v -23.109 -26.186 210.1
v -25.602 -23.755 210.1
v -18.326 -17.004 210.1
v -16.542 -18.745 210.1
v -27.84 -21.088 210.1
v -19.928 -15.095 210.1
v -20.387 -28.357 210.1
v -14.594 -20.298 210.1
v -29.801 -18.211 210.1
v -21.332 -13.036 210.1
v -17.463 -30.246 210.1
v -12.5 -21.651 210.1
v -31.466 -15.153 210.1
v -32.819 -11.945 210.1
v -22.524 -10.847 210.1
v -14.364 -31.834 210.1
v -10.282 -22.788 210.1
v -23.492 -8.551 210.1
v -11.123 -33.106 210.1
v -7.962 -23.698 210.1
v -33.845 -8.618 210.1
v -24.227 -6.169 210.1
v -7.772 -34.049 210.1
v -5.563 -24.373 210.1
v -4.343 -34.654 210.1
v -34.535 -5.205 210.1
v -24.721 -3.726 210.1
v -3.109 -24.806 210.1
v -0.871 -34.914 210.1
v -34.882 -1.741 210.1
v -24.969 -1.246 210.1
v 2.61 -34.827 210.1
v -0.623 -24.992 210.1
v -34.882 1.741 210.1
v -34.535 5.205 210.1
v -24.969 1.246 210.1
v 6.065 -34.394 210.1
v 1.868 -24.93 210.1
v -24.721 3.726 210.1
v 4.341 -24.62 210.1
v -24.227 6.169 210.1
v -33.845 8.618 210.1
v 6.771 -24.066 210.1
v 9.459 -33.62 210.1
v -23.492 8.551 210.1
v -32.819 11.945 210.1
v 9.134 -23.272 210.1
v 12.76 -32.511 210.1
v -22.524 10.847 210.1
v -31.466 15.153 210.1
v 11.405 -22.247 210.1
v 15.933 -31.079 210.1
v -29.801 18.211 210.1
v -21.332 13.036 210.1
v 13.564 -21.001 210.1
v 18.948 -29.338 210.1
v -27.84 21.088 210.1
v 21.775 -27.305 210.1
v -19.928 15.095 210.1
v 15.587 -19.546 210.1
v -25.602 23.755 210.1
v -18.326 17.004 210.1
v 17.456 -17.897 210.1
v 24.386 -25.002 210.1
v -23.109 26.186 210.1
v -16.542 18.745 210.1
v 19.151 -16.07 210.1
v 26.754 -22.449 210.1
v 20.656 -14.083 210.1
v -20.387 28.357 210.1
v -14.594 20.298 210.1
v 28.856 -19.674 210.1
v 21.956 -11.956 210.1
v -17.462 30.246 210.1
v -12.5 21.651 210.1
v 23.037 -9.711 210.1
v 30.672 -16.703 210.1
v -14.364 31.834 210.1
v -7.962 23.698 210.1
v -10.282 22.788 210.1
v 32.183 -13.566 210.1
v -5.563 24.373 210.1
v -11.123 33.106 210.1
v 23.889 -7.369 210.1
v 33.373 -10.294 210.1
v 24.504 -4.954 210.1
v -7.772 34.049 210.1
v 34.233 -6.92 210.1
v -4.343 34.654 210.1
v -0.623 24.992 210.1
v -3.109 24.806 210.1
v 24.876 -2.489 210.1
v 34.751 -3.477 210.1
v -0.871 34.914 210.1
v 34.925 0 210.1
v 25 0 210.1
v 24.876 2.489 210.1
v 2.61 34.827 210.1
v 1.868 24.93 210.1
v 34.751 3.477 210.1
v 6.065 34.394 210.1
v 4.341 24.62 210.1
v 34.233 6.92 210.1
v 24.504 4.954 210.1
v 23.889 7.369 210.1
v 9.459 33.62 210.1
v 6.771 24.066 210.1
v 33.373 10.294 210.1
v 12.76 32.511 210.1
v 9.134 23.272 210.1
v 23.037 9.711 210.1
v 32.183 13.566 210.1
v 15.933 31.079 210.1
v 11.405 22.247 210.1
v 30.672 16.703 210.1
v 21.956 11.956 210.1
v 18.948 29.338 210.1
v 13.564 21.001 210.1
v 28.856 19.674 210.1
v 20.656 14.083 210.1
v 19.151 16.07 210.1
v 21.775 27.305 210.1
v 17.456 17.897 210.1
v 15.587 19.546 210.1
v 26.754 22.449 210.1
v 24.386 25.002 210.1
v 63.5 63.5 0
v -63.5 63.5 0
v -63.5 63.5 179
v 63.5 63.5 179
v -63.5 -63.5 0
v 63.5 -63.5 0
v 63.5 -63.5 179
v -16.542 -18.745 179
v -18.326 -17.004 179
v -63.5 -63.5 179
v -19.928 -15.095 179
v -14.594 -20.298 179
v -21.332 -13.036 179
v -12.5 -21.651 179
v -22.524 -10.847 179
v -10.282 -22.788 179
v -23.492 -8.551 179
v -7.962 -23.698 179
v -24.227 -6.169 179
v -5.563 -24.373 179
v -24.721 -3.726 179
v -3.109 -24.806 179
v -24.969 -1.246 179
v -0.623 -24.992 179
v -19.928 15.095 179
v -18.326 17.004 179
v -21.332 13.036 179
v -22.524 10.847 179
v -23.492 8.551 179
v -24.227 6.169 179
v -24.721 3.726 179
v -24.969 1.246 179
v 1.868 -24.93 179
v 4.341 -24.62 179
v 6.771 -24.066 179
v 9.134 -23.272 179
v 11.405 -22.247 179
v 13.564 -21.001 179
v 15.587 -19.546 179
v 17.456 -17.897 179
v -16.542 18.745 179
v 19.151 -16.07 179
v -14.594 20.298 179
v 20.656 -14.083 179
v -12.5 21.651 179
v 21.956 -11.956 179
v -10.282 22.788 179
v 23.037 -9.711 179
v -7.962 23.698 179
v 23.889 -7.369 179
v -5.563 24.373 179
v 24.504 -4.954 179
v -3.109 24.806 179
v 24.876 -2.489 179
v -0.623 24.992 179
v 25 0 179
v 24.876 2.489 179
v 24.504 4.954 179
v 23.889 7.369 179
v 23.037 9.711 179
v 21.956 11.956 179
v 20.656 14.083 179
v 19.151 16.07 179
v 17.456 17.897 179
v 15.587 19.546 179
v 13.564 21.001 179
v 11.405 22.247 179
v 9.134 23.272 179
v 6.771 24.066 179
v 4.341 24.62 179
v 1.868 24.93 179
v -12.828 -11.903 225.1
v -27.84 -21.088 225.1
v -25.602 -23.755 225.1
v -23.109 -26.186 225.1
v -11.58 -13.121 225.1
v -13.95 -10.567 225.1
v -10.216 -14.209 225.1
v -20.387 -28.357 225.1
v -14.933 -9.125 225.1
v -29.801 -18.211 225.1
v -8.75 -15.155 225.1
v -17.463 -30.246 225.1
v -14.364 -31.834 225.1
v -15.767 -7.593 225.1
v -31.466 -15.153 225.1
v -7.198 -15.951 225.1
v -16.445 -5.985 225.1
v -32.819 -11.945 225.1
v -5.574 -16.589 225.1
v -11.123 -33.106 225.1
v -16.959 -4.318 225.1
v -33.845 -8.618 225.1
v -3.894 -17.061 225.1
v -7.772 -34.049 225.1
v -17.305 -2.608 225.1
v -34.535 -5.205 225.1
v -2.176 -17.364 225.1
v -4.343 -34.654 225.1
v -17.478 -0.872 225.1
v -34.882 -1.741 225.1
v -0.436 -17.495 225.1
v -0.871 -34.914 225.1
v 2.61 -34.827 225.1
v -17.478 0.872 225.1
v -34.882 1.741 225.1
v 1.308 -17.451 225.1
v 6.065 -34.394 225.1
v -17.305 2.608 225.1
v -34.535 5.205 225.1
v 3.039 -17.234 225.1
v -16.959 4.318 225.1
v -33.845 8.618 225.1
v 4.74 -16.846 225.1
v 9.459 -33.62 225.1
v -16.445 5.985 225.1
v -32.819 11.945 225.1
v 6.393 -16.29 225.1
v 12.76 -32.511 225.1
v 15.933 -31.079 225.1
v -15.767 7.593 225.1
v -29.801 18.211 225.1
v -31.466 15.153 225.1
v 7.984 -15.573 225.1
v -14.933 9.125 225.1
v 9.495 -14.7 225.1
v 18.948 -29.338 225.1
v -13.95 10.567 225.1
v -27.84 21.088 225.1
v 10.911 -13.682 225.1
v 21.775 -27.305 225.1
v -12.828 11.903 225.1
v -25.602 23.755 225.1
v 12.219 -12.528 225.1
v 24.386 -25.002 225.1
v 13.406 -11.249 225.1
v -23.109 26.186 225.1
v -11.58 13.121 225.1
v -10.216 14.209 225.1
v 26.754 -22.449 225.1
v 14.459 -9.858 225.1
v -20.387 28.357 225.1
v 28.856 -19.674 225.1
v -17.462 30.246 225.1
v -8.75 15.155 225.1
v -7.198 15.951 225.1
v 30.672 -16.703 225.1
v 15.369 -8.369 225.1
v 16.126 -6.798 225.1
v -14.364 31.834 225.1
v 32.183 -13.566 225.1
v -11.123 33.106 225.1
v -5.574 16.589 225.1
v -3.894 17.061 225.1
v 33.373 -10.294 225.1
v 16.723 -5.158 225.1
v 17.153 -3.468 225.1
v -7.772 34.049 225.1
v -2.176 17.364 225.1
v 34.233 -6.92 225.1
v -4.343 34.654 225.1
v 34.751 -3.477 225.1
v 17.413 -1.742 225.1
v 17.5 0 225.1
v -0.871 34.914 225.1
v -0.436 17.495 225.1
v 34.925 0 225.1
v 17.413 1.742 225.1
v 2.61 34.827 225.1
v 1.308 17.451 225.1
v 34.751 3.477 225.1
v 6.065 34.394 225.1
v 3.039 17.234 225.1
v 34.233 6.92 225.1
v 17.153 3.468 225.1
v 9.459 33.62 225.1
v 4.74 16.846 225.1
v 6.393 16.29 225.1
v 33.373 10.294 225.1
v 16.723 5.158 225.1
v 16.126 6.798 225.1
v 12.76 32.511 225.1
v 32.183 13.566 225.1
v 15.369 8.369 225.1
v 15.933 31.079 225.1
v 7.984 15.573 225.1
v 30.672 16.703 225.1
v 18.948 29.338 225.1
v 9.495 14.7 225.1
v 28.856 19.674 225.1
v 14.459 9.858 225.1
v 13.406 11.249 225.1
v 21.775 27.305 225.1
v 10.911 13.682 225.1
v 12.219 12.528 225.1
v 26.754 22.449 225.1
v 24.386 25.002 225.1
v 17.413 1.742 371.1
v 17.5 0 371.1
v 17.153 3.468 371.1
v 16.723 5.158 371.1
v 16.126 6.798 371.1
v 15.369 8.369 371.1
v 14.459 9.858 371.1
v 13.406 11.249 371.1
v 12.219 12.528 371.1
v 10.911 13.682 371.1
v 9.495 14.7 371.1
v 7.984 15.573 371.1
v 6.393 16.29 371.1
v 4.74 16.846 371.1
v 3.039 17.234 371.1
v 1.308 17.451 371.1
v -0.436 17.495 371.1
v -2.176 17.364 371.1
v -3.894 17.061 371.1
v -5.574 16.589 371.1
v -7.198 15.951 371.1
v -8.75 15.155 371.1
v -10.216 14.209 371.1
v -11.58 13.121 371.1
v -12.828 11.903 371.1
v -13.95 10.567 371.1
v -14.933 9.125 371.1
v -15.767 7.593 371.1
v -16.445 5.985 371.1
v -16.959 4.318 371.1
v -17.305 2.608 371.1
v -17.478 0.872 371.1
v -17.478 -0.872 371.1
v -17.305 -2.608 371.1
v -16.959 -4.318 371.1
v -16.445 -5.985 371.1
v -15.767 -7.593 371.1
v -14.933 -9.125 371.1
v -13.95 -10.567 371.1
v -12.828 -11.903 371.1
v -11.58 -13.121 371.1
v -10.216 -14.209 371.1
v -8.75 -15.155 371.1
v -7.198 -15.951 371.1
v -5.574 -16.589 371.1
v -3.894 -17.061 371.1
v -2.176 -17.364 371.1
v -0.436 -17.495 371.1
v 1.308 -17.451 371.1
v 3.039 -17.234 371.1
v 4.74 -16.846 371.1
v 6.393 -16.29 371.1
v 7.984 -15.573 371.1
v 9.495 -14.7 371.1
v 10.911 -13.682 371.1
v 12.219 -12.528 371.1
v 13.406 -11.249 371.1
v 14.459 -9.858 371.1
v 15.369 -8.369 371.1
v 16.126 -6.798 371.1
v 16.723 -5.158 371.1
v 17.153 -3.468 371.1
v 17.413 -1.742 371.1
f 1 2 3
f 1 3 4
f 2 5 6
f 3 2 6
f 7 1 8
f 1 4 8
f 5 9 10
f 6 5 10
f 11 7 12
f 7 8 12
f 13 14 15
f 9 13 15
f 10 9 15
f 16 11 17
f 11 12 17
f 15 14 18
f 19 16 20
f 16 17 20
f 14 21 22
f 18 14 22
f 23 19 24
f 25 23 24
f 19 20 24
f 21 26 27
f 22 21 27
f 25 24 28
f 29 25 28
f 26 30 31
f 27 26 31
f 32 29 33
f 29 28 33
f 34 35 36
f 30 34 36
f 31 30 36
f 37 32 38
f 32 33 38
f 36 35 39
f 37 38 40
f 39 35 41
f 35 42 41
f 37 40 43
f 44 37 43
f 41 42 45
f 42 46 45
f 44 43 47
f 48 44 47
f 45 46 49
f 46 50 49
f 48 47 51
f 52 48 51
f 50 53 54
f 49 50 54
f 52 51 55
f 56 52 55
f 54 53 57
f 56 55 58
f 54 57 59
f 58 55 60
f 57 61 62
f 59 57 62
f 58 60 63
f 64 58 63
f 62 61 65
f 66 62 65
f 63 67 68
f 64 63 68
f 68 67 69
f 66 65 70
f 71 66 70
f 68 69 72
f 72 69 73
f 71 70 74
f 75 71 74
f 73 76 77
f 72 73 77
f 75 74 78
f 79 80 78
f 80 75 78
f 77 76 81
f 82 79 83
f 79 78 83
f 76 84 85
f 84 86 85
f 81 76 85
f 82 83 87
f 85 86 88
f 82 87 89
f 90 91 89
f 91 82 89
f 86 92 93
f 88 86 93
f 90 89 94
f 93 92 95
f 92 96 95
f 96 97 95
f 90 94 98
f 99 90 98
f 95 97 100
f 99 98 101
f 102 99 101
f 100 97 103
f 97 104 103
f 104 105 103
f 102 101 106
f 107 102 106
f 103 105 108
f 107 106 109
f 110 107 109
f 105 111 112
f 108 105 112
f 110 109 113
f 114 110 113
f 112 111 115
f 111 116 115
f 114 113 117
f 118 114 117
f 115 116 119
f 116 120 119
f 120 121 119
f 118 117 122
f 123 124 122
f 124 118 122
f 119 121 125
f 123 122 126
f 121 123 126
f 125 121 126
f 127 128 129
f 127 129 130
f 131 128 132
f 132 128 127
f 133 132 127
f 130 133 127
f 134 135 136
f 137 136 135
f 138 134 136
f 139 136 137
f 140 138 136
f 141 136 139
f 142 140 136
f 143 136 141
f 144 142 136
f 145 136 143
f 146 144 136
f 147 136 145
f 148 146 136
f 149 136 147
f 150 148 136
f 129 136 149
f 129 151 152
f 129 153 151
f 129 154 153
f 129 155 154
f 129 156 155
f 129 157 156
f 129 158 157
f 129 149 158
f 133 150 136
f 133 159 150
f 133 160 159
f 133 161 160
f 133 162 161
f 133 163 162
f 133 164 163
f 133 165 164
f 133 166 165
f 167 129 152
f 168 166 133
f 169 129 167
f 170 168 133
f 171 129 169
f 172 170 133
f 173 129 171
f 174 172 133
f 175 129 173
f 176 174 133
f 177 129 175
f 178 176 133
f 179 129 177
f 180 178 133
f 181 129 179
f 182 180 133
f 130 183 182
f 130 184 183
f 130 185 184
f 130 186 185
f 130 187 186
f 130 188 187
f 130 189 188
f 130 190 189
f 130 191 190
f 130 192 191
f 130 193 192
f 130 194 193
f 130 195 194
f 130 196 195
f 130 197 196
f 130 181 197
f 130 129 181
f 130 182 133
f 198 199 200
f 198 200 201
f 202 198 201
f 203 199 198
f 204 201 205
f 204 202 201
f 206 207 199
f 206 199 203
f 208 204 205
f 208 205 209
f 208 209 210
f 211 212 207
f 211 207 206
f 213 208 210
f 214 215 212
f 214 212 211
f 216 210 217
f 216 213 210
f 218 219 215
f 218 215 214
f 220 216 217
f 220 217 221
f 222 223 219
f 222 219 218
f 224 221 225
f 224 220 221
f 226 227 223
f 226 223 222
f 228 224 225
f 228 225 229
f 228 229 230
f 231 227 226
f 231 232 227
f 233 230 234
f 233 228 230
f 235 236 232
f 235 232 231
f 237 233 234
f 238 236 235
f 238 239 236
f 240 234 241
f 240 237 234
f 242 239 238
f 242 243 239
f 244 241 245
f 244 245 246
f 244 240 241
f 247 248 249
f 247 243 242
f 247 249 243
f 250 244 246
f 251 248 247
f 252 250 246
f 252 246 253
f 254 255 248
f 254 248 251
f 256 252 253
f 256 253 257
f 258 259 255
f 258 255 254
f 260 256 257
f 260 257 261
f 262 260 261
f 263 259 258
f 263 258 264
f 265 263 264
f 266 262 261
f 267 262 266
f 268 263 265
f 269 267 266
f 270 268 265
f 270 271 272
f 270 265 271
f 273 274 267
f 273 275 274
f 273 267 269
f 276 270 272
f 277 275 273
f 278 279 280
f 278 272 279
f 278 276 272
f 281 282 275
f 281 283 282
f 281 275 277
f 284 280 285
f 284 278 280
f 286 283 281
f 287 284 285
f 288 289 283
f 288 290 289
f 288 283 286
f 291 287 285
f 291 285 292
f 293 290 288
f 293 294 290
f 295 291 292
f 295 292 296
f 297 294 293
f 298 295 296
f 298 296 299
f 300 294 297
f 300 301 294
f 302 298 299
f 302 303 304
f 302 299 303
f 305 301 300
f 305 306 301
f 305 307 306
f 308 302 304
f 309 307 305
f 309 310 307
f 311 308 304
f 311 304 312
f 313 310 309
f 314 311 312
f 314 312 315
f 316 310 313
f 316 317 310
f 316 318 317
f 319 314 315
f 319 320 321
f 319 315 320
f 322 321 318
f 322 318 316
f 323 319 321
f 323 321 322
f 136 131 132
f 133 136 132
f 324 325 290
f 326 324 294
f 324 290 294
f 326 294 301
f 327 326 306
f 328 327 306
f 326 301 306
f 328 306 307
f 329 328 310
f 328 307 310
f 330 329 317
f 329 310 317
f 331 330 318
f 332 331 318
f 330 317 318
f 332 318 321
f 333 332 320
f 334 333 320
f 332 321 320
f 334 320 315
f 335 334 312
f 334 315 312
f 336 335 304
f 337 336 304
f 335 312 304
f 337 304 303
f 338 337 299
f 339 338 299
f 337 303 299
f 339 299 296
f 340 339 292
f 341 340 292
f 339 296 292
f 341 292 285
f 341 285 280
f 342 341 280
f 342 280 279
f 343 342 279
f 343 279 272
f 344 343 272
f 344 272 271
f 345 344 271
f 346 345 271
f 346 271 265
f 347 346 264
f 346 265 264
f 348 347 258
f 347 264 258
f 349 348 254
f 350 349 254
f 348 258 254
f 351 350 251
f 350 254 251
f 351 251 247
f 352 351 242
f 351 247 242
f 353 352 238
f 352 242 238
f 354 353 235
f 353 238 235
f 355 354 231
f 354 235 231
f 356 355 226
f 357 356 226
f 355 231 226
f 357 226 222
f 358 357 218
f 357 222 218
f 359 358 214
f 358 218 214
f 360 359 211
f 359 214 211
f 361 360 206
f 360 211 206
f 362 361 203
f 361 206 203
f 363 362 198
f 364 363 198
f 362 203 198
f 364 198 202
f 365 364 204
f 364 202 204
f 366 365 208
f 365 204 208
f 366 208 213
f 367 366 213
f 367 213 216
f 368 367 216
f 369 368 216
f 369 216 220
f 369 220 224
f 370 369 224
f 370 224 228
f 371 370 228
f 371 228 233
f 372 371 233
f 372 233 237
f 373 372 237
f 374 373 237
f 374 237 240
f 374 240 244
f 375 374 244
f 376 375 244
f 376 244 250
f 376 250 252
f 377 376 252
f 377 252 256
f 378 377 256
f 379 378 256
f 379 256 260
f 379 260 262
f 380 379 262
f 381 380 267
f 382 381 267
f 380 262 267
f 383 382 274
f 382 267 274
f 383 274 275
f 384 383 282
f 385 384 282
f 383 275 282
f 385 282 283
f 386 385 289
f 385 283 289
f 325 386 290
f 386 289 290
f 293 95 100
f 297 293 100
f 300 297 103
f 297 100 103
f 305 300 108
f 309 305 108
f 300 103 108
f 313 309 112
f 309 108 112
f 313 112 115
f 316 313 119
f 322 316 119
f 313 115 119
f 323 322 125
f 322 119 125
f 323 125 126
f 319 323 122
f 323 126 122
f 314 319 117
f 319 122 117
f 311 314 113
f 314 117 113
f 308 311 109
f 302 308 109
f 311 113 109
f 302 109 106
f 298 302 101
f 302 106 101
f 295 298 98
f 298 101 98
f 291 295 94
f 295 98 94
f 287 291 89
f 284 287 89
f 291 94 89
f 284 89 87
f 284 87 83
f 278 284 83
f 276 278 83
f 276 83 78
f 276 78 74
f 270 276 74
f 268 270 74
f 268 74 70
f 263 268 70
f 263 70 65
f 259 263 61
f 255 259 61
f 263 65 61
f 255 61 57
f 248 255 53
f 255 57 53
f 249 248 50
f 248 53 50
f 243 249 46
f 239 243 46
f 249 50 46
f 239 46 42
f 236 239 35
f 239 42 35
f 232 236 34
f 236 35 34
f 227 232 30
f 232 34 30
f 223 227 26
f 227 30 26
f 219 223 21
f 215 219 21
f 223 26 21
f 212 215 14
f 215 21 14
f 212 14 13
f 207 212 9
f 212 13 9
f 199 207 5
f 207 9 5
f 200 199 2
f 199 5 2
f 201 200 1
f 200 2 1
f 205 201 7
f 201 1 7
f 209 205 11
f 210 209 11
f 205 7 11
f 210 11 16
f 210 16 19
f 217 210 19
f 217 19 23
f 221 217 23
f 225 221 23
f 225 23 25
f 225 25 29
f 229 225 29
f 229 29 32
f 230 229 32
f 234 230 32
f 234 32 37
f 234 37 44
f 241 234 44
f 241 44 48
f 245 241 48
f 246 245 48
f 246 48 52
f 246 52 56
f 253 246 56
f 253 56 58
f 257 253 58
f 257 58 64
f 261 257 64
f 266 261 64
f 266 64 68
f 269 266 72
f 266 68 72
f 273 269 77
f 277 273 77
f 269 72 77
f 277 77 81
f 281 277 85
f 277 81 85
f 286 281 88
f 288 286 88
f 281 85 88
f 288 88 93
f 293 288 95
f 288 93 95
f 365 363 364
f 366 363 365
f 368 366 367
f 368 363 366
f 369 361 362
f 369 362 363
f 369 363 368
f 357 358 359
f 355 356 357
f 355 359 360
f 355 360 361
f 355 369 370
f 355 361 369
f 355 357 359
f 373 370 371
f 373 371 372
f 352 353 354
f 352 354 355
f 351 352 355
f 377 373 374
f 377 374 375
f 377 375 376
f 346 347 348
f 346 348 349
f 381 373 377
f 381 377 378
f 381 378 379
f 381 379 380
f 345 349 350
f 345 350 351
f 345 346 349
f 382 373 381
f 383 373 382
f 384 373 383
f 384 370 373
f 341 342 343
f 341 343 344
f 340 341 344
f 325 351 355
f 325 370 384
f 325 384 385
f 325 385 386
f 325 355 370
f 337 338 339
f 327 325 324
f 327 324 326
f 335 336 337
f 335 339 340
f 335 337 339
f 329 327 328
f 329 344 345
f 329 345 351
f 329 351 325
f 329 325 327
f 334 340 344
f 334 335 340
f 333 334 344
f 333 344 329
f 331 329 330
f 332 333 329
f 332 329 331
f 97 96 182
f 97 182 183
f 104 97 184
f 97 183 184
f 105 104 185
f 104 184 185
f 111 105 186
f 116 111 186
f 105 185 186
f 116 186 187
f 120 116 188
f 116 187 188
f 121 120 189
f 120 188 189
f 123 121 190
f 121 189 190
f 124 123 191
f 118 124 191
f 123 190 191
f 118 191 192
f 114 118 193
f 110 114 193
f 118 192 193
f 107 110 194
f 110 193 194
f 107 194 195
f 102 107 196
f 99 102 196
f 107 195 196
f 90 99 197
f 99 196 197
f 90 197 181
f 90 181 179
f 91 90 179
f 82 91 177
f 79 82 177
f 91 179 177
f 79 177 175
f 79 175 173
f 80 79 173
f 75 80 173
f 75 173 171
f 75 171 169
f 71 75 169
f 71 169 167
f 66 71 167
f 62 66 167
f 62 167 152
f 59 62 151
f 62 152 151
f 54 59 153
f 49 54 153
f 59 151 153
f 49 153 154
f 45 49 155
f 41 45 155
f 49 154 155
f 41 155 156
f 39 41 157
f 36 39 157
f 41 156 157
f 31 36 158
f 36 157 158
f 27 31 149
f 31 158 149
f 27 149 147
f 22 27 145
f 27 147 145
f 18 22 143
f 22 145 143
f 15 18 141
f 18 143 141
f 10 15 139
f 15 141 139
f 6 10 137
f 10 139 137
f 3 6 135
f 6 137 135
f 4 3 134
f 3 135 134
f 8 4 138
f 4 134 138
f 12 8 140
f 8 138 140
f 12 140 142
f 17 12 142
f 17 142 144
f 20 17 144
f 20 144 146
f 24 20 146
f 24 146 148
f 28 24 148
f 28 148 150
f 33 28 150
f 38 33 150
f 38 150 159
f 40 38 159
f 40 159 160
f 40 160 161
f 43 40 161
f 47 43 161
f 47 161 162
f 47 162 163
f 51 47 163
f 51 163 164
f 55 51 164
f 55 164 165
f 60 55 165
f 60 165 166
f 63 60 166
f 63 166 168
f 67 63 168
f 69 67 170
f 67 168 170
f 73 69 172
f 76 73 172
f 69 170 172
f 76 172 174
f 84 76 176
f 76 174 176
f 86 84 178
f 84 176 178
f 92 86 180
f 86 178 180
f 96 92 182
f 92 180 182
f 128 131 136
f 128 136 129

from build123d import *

# Parameters (mm, degrees)
SKETCH1_W           = 127
SKETCH1_H           = 127
BOSS_EXTRUDE1_DEPTH = 179
SKETCH2_R           = 25
BOSS_EXTRUDE2_DEPTH = 31.1
SKETCH3_R           = 34.925
BOSS_EXTRUDE3_DEPTH = 15
SKETCH4_R           = 17.5
BOSS_EXTRUDE4_DEPTH = 146


with BuildPart() as part:
    # Sketch1 → Boss-Extrude1 (new body)
    with BuildSketch(Plane.XY):
        Rectangle(SKETCH1_W, SKETCH1_H)
    extrude(amount=BOSS_EXTRUDE1_DEPTH)

    # Sketch2 → Boss-Extrude2 (add)
    with BuildSketch(Plane.XY.offset(179)):
        Circle(SKETCH2_R)
    extrude(amount=BOSS_EXTRUDE2_DEPTH)

    # Sketch3 → Boss-Extrude3 (add)
    with BuildSketch(Plane.XY.offset(210.1)):
        Circle(SKETCH3_R)
    extrude(amount=BOSS_EXTRUDE3_DEPTH)

    # Sketch4 → Boss-Extrude4 (add)
    with BuildSketch(Plane.XY.offset(225.1)):
        Circle(SKETCH4_R)
    extrude(amount=BOSS_EXTRUDE4_DEPTH)


solid = part.part
